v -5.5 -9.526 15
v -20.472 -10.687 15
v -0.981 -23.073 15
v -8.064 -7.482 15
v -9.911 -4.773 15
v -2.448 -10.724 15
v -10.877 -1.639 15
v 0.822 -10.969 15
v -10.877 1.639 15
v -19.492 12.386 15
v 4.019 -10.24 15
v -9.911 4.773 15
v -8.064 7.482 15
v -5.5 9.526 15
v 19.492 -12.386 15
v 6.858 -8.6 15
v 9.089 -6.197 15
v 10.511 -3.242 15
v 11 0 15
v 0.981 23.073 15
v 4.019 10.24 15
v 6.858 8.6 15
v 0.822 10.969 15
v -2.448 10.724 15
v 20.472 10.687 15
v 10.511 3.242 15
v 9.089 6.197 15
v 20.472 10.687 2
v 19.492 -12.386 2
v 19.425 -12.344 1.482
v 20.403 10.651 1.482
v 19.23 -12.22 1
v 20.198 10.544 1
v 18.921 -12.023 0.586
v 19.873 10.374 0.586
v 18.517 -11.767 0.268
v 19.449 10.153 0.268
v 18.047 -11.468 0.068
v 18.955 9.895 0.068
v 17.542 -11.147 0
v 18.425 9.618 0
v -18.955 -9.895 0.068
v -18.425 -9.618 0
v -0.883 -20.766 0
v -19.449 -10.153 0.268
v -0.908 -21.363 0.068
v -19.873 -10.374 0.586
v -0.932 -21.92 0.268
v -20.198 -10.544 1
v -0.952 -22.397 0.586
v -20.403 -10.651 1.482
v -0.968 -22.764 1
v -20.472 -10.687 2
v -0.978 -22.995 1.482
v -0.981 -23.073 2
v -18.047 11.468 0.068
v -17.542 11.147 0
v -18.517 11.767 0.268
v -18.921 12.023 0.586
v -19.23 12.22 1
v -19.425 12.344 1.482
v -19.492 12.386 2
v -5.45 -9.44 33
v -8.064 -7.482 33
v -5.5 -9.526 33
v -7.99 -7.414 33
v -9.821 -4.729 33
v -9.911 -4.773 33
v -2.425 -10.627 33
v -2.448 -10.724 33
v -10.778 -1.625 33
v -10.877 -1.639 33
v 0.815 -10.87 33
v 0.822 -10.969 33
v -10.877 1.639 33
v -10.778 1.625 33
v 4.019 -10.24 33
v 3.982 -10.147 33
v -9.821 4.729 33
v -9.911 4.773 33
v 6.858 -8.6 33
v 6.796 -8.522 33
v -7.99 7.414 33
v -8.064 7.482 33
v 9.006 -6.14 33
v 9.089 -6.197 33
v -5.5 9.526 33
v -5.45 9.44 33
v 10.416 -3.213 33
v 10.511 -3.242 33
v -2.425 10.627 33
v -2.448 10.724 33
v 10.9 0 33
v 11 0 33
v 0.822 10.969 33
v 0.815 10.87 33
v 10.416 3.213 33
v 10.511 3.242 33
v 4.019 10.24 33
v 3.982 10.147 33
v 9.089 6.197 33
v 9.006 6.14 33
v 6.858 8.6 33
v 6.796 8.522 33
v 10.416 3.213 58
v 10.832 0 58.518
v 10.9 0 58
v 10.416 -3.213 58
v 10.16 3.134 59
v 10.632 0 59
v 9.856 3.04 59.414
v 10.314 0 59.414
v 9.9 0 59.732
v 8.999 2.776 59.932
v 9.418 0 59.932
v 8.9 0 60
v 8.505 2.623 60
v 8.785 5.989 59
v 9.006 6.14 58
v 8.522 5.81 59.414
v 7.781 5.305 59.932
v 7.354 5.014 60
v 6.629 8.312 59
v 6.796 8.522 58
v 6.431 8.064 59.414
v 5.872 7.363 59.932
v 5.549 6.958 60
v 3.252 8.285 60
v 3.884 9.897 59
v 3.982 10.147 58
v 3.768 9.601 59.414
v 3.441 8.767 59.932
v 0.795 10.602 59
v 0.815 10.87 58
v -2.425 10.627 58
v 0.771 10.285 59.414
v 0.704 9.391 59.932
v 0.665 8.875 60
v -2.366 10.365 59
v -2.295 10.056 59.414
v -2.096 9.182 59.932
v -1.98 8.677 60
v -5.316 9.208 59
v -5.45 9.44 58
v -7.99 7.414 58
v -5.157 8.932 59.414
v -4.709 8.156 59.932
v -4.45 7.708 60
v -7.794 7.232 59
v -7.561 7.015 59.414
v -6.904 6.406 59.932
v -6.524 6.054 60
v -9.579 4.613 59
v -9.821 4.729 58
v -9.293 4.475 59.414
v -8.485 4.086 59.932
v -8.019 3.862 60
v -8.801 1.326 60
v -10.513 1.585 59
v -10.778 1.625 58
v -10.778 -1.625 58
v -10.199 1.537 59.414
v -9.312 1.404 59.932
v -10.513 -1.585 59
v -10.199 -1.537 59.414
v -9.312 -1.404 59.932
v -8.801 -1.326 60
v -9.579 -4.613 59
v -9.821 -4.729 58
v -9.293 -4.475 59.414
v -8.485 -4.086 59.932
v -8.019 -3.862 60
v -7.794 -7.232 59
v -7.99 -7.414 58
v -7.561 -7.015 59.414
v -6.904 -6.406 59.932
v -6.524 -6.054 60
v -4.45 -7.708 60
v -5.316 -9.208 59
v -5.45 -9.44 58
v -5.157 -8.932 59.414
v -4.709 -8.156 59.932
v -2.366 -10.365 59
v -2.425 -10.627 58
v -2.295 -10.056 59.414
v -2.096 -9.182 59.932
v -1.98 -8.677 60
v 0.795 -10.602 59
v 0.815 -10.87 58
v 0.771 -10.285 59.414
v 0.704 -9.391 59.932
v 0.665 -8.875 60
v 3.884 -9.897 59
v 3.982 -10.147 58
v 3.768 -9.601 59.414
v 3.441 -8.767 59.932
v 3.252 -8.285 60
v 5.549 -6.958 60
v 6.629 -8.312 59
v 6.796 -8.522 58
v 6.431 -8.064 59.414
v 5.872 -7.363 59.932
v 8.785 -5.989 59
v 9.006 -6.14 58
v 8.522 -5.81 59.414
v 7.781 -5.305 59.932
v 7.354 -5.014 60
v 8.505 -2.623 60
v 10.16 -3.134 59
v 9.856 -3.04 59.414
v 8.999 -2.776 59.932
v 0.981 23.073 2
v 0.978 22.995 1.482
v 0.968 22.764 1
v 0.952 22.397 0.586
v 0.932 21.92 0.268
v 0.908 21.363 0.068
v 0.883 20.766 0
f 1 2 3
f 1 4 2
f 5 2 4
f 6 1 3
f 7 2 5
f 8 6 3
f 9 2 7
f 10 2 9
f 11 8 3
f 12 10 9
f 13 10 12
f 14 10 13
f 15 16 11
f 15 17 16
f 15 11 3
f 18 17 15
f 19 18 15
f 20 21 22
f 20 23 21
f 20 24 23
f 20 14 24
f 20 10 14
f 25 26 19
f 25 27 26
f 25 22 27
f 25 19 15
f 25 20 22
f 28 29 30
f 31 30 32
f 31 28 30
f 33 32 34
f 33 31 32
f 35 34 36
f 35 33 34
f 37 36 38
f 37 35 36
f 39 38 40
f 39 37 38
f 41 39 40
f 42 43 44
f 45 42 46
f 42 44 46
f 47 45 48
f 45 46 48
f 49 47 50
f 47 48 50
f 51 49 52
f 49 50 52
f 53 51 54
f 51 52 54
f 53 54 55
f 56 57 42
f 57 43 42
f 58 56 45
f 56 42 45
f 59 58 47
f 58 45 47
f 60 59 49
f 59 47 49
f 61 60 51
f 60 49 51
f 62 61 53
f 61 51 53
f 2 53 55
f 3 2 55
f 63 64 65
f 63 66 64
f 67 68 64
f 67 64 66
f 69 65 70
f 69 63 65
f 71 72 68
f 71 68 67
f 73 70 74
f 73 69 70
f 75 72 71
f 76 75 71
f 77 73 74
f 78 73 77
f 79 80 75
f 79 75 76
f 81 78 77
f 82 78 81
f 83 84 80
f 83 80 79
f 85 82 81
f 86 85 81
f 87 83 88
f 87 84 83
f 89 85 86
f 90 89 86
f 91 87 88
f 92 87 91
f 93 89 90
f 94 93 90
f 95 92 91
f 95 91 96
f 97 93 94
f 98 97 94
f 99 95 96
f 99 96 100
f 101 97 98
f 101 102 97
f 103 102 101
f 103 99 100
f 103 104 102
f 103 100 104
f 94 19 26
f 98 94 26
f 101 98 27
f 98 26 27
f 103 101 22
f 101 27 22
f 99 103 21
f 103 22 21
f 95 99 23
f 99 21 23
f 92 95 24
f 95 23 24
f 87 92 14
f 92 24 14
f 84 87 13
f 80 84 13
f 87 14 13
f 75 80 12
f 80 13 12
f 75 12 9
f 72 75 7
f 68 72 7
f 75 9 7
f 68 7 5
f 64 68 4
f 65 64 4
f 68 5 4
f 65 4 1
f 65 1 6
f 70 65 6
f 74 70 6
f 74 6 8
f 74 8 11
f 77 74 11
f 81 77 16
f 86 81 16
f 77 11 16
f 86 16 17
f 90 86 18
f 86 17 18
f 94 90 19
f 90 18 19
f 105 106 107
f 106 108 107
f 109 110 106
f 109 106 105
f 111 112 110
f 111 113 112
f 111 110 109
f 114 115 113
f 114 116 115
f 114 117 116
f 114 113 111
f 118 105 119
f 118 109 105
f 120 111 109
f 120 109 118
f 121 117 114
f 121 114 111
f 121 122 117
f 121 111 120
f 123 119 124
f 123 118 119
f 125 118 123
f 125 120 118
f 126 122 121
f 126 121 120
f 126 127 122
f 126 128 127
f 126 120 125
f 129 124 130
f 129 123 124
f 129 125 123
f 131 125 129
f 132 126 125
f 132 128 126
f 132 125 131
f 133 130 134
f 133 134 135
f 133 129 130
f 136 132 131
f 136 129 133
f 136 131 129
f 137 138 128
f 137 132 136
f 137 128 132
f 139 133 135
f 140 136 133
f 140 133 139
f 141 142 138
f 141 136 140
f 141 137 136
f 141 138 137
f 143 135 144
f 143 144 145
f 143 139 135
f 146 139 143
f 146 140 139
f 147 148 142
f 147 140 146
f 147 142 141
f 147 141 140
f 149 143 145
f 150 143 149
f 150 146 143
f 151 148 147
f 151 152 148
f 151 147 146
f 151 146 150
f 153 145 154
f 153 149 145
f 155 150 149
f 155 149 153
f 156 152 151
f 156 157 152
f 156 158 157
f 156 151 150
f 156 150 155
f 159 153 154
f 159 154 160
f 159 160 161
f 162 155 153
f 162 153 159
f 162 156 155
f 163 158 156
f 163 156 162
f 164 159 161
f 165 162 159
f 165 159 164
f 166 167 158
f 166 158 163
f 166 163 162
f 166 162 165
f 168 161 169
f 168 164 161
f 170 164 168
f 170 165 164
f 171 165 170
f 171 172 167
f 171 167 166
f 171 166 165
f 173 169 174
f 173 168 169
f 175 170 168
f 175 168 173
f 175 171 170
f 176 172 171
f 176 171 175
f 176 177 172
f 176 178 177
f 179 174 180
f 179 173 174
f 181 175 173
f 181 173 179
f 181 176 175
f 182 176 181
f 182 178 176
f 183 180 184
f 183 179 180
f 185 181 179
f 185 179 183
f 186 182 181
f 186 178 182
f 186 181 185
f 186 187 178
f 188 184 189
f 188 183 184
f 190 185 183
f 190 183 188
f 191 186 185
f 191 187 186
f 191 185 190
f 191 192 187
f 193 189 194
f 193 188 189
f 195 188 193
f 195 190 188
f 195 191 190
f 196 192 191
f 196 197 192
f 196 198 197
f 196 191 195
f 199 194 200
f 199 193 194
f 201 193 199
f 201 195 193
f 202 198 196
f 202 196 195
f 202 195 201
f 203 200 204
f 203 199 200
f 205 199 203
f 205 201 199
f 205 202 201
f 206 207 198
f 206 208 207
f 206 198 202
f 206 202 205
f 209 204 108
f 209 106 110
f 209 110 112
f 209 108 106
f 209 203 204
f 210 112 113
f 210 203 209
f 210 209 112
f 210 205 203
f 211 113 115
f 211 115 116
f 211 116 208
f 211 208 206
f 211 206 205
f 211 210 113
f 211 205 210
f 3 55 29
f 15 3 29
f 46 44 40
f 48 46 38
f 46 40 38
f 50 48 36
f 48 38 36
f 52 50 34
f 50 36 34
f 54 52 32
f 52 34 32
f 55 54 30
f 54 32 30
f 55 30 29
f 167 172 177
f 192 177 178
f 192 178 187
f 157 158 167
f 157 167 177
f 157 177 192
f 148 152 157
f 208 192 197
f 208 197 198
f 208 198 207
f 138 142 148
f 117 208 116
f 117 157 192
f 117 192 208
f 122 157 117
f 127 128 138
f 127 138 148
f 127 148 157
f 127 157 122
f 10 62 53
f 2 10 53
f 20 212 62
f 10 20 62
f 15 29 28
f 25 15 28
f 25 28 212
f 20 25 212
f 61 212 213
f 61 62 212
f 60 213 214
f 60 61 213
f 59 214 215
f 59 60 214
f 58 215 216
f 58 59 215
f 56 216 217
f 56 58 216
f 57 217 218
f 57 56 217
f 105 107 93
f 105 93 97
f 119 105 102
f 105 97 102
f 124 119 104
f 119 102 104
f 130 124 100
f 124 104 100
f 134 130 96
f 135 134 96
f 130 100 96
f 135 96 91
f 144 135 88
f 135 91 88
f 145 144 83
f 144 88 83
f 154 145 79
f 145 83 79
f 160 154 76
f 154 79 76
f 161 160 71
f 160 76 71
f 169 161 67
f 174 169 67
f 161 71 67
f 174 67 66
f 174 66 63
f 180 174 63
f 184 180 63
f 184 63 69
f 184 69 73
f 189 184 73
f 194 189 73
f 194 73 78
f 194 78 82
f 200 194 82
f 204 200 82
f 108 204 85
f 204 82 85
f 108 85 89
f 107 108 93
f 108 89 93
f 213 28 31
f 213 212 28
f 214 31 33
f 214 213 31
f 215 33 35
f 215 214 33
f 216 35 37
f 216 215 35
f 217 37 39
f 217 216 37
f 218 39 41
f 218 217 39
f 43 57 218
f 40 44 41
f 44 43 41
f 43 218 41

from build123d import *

# Parameters (mm, degrees)
EXTRUDE_430_DEPTH = 15
SKETCH_2_R        = 11
EXTRUDE_1_DEPTH   = 18
FILLET_3_R        = 2
SKETCH_3_R        = 10.9
EXTRUDE_1_2_DEPTH = 27
FILLET_4_R        = 2


with BuildPart() as part:
    # 草图1 → Extrude 430 (new body)
    with BuildSketch(Plane.XY):
        Polygon((20.472392036, 10.687118304), (0.980880074, 23.073170732), (-19.491511963, 12.386052428), (-20.472392036, -10.687118304), (-0.980880074, -23.073170732), (19.491511963, -12.386052428), align=None)
    extrude(amount=EXTRUDE_430_DEPTH)

    # 草图2 → Extrude 1 (add)
    with BuildSketch(Plane.XY.offset(15)):
        Circle(SKETCH_2_R)
    extrude(amount=EXTRUDE_1_DEPTH)

    # 圆角3
    fillet_3_edges = [part.edges().sort_by_distance(p)[0] for p in [
        (9.255315945, -17.72961158, 0),
        (-10.726636055, -16.880144518, 0),
        (-19.981952, 0.849467062, 0),
        (-9.255315945, 17.72961158, 0),
        (10.726636055, 16.880144518, 0),
        (19.981952, -0.849467062, 0),
    ]]
    fillet(fillet_3_edges, radius=FILLET_3_R)

    # 草图3 → Extrude 1 2 (add)
    with BuildSketch(Plane.XY.offset(33)):
        Circle(SKETCH_3_R)
    extrude(amount=EXTRUDE_1_2_DEPTH)

    # 圆角4
    fillet_4_edges = [part.edges().sort_by_distance(p)[0] for p in [
        (-10.9, 0, 60),
    ]]
    fillet(fillet_4_edges, radius=FILLET_4_R)


solid = part.part
